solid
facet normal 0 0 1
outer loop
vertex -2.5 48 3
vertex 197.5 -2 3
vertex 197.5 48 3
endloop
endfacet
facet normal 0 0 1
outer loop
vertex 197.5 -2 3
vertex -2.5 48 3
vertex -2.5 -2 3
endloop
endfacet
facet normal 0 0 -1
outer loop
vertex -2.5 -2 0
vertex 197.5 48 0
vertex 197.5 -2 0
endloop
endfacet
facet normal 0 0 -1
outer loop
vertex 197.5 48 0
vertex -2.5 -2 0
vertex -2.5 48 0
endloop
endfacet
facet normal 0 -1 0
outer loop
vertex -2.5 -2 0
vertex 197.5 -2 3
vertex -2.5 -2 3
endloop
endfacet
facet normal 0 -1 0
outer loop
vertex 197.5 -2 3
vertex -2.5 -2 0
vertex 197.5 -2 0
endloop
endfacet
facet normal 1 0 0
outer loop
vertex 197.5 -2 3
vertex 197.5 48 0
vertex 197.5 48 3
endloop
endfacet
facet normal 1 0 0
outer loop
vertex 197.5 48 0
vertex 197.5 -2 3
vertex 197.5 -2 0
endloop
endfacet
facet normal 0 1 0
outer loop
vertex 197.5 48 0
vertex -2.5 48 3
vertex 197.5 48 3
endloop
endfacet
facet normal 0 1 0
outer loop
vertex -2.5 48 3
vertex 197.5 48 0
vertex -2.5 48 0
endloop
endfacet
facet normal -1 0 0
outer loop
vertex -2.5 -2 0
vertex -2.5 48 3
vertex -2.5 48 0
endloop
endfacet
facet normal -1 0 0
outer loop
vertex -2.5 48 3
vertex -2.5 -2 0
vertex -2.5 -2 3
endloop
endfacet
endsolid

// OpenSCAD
color([0,0,1.]) translate([0,0,3])
  linear_extrude(height = 3, center = true, convexity = 10)
  import("sylas.dxf");

color([0,0,0]) translate([-2.5,-2,0]) cube([200,50,3]);
